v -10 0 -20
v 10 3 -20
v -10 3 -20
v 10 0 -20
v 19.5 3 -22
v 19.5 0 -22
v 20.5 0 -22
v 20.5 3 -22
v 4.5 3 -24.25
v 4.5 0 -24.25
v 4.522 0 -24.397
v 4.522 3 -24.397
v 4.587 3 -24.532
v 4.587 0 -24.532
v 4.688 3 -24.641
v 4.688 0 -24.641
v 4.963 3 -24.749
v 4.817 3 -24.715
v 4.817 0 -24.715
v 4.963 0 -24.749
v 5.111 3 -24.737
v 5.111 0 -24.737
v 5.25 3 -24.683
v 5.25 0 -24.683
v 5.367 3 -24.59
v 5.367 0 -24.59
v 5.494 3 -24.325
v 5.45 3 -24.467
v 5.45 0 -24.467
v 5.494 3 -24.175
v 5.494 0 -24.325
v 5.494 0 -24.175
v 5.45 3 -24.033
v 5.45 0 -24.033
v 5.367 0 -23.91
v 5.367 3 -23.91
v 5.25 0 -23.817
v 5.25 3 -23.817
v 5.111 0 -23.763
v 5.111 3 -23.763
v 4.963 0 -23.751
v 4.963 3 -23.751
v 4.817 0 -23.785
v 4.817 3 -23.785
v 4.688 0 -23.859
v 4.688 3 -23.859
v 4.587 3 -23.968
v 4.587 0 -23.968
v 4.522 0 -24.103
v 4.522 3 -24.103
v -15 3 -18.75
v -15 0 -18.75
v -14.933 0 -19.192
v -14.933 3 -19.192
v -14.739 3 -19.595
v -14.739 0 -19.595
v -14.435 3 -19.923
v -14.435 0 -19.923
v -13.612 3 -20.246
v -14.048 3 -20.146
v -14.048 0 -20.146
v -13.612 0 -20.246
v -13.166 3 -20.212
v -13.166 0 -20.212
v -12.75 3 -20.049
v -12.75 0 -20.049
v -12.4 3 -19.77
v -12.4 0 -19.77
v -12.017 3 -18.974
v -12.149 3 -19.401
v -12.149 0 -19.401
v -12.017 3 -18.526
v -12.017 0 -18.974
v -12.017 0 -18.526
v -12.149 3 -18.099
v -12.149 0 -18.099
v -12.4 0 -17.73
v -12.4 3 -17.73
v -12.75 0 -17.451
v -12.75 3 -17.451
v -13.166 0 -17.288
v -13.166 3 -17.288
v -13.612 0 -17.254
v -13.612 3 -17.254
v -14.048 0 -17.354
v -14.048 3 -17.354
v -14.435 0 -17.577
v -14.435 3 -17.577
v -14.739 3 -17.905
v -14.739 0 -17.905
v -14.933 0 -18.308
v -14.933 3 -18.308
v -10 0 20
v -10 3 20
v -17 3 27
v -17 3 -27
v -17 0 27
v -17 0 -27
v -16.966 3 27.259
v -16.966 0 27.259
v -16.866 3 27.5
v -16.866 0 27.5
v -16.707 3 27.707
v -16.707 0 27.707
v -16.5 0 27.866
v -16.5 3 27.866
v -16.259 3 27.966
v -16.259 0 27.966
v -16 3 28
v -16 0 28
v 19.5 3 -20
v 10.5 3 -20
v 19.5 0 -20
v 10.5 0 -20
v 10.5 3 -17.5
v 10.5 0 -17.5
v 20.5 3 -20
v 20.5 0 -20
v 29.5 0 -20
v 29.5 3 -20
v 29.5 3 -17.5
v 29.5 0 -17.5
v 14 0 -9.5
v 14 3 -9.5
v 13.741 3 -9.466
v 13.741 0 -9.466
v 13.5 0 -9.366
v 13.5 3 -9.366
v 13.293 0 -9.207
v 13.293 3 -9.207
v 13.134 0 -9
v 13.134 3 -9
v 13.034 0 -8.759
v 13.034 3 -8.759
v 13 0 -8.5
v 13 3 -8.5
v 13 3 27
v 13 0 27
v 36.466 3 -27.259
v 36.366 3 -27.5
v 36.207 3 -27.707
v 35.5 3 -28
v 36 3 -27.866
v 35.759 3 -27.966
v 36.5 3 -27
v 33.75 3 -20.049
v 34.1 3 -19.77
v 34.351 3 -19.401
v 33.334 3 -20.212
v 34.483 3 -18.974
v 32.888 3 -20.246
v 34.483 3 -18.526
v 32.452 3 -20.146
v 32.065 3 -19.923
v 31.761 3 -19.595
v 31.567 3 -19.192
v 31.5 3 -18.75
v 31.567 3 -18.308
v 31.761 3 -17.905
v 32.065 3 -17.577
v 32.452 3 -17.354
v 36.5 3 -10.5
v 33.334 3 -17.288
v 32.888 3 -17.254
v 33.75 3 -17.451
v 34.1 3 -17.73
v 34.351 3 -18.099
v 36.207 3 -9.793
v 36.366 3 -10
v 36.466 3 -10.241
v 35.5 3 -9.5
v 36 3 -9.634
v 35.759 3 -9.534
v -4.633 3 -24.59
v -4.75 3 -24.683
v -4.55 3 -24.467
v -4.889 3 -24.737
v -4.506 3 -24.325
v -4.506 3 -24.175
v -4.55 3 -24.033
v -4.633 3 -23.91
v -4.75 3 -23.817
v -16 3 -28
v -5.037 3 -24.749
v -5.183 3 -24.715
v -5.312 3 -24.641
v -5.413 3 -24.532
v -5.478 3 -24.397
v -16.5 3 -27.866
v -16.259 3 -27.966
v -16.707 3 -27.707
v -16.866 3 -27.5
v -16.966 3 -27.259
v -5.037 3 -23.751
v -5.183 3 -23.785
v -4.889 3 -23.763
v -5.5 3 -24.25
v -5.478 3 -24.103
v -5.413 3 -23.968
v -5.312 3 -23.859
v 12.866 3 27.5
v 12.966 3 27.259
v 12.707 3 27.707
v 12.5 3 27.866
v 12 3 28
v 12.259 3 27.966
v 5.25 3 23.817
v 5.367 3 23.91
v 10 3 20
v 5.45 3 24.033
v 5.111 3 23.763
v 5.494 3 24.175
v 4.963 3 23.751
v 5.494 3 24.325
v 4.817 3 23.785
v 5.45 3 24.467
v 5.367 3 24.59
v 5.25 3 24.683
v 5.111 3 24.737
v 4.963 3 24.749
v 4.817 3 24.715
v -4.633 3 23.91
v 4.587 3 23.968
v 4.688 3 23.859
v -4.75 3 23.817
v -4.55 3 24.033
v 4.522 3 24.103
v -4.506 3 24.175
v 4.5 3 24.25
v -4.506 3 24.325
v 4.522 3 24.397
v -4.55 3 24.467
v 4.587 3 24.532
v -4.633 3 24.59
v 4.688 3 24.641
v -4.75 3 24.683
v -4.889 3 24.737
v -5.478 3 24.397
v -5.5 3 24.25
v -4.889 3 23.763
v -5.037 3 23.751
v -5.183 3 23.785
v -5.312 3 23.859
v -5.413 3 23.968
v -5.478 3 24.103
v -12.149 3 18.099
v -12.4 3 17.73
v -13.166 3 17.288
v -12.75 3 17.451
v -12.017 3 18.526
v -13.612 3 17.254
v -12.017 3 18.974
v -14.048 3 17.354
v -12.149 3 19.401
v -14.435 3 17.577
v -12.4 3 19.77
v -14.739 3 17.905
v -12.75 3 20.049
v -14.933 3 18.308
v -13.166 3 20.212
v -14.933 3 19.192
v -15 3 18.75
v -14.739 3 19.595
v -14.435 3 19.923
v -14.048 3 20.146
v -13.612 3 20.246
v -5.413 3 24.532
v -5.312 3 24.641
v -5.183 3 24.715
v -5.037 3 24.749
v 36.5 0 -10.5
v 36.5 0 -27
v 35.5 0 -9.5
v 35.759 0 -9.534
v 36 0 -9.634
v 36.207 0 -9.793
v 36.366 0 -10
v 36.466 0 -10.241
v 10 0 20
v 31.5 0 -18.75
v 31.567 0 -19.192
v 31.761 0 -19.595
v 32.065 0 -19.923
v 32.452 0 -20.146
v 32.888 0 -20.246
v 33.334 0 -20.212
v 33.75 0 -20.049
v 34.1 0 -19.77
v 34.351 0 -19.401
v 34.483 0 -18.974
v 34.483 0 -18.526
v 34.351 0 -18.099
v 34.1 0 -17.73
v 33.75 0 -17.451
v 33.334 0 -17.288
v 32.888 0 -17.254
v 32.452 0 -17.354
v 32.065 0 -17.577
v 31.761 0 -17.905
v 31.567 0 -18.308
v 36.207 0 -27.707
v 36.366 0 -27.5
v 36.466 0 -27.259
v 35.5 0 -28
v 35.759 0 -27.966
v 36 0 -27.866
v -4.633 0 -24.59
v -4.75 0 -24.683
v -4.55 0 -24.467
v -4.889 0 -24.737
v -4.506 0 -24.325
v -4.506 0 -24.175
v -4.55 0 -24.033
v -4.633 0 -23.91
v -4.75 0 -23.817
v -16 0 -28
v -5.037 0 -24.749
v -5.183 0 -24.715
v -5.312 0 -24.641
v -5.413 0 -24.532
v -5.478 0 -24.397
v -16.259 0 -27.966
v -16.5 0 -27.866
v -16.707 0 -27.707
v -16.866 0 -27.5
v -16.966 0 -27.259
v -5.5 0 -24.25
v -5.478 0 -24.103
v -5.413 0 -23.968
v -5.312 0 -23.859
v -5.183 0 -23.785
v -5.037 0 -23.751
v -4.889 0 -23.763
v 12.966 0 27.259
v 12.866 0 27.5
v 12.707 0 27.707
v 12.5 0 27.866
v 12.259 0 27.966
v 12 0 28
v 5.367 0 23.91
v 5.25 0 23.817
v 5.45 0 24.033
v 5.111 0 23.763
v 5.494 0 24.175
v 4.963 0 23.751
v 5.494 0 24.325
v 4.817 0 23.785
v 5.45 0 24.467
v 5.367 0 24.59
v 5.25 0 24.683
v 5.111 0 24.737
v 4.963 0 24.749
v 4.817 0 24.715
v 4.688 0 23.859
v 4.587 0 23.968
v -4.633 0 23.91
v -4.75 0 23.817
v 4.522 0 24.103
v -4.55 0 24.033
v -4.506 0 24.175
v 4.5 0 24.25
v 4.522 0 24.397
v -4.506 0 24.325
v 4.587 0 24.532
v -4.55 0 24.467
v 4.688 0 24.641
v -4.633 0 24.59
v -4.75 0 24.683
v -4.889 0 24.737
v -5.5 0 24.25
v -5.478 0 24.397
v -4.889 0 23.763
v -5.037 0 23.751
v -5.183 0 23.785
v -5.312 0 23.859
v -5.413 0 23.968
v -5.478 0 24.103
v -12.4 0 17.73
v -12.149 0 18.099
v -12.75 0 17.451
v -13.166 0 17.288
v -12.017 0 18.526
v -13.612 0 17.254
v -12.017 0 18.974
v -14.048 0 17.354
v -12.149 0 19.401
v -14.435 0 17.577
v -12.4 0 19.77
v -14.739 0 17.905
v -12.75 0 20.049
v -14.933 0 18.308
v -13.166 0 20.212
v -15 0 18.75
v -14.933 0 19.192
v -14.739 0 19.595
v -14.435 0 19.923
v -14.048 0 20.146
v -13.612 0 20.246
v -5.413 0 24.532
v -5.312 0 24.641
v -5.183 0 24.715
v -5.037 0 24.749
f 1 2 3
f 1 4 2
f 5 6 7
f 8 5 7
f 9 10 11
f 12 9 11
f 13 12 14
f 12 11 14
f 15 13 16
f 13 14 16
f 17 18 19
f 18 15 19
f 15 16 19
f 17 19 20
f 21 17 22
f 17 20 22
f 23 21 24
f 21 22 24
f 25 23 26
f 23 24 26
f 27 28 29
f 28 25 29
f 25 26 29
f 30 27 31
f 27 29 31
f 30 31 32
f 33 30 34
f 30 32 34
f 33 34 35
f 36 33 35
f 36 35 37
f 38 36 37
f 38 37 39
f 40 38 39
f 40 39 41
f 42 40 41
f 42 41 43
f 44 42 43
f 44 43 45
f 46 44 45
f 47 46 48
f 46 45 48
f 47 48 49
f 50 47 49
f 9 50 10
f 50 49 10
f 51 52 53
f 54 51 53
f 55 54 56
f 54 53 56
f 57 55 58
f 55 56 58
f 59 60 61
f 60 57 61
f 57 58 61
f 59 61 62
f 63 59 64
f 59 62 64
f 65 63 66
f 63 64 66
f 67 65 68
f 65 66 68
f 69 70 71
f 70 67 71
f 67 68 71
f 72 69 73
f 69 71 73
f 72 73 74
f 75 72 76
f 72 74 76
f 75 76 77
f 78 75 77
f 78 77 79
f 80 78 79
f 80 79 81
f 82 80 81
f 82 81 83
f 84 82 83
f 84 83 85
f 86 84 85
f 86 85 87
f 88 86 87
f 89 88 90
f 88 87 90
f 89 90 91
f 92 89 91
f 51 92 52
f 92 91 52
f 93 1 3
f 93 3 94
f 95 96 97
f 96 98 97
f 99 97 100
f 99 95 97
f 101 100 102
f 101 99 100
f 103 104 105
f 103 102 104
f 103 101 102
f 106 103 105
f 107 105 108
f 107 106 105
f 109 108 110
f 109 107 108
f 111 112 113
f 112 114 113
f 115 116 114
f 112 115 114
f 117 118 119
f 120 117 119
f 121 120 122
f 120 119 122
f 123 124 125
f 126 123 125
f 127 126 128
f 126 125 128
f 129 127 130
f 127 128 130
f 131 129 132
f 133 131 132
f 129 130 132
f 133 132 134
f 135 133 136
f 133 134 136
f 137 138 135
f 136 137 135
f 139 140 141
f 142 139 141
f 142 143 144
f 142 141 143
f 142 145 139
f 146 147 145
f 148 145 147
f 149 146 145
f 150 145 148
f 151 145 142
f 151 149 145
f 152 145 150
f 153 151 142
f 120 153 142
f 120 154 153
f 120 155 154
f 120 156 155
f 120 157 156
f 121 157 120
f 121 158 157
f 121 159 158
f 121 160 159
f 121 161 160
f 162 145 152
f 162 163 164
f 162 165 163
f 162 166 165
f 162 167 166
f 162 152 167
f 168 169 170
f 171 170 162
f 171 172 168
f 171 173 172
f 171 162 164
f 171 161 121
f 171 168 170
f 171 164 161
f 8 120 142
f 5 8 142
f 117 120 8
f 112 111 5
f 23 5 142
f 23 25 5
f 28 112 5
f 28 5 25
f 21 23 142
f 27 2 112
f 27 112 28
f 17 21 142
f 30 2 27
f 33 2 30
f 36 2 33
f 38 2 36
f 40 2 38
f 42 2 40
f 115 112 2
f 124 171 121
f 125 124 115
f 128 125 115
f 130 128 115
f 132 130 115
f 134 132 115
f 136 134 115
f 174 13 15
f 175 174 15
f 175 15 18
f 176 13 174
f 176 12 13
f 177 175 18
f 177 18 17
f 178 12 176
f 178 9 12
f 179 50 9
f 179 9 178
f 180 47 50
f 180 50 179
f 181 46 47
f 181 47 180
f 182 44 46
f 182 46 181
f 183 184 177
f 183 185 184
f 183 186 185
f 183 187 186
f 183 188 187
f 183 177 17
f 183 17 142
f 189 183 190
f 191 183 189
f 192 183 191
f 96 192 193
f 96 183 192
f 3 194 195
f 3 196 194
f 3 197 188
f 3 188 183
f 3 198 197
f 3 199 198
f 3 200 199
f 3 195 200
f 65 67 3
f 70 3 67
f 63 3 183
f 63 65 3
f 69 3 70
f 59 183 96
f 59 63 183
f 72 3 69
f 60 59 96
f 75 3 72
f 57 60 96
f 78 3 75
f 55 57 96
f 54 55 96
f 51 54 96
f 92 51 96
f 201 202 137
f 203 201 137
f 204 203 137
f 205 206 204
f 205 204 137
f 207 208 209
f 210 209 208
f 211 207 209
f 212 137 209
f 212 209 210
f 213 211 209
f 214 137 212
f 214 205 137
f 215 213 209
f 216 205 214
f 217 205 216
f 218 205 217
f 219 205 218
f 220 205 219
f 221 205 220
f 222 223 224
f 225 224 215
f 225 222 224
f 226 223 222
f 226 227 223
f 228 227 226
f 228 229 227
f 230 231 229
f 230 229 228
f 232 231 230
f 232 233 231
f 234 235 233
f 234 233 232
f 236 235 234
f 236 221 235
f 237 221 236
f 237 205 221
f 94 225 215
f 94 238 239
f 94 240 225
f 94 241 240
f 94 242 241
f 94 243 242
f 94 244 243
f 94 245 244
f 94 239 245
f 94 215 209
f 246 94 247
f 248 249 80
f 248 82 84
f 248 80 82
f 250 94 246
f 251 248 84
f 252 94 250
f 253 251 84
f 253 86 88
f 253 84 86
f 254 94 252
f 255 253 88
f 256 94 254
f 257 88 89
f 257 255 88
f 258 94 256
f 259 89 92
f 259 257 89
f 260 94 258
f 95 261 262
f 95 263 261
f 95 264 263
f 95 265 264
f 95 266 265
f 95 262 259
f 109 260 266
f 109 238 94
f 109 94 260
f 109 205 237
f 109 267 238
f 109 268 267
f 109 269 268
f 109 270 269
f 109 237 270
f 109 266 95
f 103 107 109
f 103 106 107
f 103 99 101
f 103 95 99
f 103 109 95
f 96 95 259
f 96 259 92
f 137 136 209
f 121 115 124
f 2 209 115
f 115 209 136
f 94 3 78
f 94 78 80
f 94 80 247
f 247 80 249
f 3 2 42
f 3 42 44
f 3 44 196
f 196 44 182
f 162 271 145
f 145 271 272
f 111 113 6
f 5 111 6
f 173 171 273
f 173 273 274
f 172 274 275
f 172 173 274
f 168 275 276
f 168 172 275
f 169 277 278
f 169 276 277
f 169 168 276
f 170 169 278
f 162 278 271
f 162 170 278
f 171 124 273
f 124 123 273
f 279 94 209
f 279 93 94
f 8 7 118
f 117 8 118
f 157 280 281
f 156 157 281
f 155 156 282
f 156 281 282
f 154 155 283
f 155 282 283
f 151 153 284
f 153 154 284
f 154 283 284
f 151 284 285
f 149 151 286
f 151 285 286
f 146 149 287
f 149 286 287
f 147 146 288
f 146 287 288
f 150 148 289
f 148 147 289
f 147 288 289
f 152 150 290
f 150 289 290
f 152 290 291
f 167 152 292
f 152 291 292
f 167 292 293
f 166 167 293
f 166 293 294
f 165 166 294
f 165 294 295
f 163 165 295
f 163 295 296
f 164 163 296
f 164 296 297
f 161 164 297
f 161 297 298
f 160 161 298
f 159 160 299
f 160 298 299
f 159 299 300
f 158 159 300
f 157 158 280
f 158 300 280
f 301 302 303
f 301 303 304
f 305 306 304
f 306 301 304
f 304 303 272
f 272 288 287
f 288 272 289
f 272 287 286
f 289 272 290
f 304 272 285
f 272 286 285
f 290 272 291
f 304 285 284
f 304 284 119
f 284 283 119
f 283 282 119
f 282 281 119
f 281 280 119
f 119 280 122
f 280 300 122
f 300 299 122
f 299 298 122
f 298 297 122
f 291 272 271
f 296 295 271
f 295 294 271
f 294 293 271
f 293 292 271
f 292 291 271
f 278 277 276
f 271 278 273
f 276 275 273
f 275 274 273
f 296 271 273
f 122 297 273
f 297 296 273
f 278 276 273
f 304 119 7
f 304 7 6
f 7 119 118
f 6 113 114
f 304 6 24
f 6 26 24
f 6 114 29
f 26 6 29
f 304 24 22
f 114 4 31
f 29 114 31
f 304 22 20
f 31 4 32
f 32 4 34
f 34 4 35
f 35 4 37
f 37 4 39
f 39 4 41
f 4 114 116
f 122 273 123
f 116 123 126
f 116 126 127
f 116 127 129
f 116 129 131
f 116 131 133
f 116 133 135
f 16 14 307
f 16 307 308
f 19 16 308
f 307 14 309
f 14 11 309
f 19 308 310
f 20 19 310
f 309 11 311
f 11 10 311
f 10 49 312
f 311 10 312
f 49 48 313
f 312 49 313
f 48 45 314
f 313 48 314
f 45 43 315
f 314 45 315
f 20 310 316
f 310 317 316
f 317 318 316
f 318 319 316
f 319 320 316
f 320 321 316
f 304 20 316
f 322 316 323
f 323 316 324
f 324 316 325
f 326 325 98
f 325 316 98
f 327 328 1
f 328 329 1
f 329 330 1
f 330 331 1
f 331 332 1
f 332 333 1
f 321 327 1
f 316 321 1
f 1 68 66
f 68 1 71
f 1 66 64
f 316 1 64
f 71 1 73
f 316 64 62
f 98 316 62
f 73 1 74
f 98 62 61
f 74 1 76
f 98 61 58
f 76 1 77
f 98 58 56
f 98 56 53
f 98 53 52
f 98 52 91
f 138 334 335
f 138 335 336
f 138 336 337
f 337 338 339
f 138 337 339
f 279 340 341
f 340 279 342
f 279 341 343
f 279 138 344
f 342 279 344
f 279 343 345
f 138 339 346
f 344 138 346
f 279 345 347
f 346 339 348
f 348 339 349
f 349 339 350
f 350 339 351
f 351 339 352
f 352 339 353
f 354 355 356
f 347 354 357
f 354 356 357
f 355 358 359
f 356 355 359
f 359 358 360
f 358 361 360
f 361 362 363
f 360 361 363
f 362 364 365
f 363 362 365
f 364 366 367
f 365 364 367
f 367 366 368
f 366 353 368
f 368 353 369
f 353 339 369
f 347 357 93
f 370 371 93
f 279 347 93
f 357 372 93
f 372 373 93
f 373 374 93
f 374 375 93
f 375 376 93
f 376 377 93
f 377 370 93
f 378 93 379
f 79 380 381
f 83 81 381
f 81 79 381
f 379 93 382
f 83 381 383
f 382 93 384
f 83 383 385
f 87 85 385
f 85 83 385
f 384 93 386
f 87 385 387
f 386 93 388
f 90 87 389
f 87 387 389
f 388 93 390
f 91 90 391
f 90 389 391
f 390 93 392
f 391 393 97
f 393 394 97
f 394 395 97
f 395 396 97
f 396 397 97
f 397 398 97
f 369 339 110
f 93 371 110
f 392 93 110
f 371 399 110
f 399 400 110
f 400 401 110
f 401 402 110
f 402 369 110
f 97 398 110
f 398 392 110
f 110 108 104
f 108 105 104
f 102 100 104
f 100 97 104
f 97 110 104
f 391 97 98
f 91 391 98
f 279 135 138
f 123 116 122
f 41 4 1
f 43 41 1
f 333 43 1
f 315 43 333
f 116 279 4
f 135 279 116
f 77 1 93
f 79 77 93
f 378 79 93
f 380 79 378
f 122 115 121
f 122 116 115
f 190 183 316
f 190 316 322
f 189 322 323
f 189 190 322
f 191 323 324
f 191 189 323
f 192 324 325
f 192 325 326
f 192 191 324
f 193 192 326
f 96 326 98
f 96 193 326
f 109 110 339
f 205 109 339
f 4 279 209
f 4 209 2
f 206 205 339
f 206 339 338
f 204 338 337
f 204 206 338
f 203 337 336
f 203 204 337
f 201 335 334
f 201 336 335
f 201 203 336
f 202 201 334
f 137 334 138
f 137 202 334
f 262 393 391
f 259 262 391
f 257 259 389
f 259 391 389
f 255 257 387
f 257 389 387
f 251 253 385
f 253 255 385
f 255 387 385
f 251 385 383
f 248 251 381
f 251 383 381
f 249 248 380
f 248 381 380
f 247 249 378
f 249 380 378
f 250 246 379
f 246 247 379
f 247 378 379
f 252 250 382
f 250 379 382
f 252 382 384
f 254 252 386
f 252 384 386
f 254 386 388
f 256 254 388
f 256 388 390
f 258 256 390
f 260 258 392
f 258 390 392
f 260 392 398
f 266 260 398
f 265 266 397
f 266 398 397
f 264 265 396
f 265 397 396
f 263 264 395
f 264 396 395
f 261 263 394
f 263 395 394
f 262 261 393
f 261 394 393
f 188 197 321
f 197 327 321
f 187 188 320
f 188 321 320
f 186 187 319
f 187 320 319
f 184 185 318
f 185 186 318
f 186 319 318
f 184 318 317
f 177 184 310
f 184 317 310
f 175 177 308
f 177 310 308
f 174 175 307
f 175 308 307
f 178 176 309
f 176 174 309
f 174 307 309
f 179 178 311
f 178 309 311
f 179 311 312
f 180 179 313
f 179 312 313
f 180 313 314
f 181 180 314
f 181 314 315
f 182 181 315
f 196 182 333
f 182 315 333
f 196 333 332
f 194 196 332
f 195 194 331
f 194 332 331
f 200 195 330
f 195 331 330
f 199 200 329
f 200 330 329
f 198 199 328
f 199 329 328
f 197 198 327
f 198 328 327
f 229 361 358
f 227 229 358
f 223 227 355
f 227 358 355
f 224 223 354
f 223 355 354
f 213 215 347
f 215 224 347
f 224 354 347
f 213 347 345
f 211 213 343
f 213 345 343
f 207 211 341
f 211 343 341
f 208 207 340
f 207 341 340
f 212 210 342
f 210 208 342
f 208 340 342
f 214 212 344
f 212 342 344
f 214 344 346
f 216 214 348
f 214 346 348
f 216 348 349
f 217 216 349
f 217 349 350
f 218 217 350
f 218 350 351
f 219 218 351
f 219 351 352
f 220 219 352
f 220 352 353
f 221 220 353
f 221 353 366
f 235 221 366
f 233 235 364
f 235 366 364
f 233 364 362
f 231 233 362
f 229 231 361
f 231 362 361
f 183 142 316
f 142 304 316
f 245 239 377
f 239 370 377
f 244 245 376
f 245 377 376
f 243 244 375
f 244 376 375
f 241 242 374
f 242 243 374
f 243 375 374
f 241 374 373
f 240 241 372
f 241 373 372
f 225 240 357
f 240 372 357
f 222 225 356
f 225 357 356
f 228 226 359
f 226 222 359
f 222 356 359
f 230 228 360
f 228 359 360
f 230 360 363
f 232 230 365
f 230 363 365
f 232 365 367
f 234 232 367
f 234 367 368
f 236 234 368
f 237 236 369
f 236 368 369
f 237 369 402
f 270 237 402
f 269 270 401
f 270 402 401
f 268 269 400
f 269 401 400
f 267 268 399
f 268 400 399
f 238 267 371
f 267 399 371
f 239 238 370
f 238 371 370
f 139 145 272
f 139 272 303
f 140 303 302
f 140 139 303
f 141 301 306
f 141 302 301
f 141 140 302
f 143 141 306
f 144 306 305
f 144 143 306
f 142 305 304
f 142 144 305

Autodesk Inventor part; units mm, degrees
ref_plane "YZ Plane" through (0, 0, 0) normal (1, 0, 0) x (0, 1, 0)
ref_plane "XZ Plane" through (0, 0, 0) normal (0, 1, 0) x (-1, 0, 0)
ref_plane "XY Plane" through (0, 0, 0) normal (0, 0, 1) x (1, 0, 0)
sketch "Sketch1" plane through (0, 0, 0) normal (0, 1, 0) x (-1, 0, 0)
  line L0 (46, 0) -> (-35, 0) construction
  line L1 (0, 54) -> (0, -60) construction
  line L2 (10, 20) -> (-10, 20)
  line L3 (-10, 20) -> (-10, -20)
  line L4 (-10, -20) -> (10, -20)
  line L5 (10, -20) -> (10, 20)
  line L6 (17, -28) -> (17, 28)
  line L7 (17, 28) -> (-13, 28)
  line L8 (-13, 28) -> (-13, -9.5)
  line L9 (-13, -9.5) -> (-36.5, -9.5)
  line L10 (-36.5, -9.5) -> (-36.5, -28)
  line L11 (-36.5, -28) -> (17, -28)
  line L12 (-29.5, -20) -> (-29.5, -17.5)
  line L13 (-10.5, -17.5) -> (-10.5, -20)
  circle A0 centre (5, 24.25) radius 0.5
  circle A1 centre (-5, 24.25) radius 0.5
  line L14 (14.6784, 24.25) -> (-18, 24.25) construction
  circle A2 centre (5, -24.25) radius 0.5
  circle A3 centre (-5, -24.25) radius 0.5
  circle A4 centre (13.5, -18.75) radius 1.5
  circle A5 centre (13.5, 18.75) radius 1.5
  circle A6 centre (-33, -18.75) radius 1.5
  line L15 (-20, 4) -> (-20, -26.5) construction
  line L16 (-10.5, -20) -> (-19.5, -20)
  line L17 (-19.5, -20) -> (-19.5, -22)
  line L18 (-19.5, -22) -> (-20.5, -22)
  line L19 (-20.5, -22) -> (-20.5, -20)
  line L20 (-20.5, -20) -> (-29.5, -20)
  line L21 (-10.5, -17.5) -> (-29.5, -17.5)
  point P0 (0, 0)
  point P1 (-20.5, -17.5)
  dimension "d0" = 40
  dimension "d1" = 20
  dimension "d2" = 7
  dimension "d3" = 8
  dimension "d4" = 8
  dimension "d5" = 3
  dimension "d6" = 20
  dimension "d7" = 10
  dimension "d8" = 19
  dimension "d9" = 2.5
  dimension "d10" = 0.5
  dimension "d11" = 1
  dimension "d12" = 1
  dimension "d13" = 5
  dimension "d14" = 5
  dimension "d15" = 4.25
  dimension "d16" = 3
  dimension "d17" = 9.25
  dimension "d19" = 18.5
  dimension "d20" = 7
  dimension "d21" = 3
  dimension "d23" = 9.25
  dimension "d29" = 3.5
  dimension "d30" = 3.5
  dimension "d31" = 2
  dimension "d32" = 1
extrude "Extrusion1" add sketch "Sketch1" along normal blind 3
fillet "Fillet1" radius 1 6 edges at (-17, 1.5, 28) (13, 1.5, 28) (13, 1.5, -9.5) (36.5, 1.5, -9.5) (36.5, 1.5, -28) (-17, 1.5, -28)
properties part number "BracketCoxa"
